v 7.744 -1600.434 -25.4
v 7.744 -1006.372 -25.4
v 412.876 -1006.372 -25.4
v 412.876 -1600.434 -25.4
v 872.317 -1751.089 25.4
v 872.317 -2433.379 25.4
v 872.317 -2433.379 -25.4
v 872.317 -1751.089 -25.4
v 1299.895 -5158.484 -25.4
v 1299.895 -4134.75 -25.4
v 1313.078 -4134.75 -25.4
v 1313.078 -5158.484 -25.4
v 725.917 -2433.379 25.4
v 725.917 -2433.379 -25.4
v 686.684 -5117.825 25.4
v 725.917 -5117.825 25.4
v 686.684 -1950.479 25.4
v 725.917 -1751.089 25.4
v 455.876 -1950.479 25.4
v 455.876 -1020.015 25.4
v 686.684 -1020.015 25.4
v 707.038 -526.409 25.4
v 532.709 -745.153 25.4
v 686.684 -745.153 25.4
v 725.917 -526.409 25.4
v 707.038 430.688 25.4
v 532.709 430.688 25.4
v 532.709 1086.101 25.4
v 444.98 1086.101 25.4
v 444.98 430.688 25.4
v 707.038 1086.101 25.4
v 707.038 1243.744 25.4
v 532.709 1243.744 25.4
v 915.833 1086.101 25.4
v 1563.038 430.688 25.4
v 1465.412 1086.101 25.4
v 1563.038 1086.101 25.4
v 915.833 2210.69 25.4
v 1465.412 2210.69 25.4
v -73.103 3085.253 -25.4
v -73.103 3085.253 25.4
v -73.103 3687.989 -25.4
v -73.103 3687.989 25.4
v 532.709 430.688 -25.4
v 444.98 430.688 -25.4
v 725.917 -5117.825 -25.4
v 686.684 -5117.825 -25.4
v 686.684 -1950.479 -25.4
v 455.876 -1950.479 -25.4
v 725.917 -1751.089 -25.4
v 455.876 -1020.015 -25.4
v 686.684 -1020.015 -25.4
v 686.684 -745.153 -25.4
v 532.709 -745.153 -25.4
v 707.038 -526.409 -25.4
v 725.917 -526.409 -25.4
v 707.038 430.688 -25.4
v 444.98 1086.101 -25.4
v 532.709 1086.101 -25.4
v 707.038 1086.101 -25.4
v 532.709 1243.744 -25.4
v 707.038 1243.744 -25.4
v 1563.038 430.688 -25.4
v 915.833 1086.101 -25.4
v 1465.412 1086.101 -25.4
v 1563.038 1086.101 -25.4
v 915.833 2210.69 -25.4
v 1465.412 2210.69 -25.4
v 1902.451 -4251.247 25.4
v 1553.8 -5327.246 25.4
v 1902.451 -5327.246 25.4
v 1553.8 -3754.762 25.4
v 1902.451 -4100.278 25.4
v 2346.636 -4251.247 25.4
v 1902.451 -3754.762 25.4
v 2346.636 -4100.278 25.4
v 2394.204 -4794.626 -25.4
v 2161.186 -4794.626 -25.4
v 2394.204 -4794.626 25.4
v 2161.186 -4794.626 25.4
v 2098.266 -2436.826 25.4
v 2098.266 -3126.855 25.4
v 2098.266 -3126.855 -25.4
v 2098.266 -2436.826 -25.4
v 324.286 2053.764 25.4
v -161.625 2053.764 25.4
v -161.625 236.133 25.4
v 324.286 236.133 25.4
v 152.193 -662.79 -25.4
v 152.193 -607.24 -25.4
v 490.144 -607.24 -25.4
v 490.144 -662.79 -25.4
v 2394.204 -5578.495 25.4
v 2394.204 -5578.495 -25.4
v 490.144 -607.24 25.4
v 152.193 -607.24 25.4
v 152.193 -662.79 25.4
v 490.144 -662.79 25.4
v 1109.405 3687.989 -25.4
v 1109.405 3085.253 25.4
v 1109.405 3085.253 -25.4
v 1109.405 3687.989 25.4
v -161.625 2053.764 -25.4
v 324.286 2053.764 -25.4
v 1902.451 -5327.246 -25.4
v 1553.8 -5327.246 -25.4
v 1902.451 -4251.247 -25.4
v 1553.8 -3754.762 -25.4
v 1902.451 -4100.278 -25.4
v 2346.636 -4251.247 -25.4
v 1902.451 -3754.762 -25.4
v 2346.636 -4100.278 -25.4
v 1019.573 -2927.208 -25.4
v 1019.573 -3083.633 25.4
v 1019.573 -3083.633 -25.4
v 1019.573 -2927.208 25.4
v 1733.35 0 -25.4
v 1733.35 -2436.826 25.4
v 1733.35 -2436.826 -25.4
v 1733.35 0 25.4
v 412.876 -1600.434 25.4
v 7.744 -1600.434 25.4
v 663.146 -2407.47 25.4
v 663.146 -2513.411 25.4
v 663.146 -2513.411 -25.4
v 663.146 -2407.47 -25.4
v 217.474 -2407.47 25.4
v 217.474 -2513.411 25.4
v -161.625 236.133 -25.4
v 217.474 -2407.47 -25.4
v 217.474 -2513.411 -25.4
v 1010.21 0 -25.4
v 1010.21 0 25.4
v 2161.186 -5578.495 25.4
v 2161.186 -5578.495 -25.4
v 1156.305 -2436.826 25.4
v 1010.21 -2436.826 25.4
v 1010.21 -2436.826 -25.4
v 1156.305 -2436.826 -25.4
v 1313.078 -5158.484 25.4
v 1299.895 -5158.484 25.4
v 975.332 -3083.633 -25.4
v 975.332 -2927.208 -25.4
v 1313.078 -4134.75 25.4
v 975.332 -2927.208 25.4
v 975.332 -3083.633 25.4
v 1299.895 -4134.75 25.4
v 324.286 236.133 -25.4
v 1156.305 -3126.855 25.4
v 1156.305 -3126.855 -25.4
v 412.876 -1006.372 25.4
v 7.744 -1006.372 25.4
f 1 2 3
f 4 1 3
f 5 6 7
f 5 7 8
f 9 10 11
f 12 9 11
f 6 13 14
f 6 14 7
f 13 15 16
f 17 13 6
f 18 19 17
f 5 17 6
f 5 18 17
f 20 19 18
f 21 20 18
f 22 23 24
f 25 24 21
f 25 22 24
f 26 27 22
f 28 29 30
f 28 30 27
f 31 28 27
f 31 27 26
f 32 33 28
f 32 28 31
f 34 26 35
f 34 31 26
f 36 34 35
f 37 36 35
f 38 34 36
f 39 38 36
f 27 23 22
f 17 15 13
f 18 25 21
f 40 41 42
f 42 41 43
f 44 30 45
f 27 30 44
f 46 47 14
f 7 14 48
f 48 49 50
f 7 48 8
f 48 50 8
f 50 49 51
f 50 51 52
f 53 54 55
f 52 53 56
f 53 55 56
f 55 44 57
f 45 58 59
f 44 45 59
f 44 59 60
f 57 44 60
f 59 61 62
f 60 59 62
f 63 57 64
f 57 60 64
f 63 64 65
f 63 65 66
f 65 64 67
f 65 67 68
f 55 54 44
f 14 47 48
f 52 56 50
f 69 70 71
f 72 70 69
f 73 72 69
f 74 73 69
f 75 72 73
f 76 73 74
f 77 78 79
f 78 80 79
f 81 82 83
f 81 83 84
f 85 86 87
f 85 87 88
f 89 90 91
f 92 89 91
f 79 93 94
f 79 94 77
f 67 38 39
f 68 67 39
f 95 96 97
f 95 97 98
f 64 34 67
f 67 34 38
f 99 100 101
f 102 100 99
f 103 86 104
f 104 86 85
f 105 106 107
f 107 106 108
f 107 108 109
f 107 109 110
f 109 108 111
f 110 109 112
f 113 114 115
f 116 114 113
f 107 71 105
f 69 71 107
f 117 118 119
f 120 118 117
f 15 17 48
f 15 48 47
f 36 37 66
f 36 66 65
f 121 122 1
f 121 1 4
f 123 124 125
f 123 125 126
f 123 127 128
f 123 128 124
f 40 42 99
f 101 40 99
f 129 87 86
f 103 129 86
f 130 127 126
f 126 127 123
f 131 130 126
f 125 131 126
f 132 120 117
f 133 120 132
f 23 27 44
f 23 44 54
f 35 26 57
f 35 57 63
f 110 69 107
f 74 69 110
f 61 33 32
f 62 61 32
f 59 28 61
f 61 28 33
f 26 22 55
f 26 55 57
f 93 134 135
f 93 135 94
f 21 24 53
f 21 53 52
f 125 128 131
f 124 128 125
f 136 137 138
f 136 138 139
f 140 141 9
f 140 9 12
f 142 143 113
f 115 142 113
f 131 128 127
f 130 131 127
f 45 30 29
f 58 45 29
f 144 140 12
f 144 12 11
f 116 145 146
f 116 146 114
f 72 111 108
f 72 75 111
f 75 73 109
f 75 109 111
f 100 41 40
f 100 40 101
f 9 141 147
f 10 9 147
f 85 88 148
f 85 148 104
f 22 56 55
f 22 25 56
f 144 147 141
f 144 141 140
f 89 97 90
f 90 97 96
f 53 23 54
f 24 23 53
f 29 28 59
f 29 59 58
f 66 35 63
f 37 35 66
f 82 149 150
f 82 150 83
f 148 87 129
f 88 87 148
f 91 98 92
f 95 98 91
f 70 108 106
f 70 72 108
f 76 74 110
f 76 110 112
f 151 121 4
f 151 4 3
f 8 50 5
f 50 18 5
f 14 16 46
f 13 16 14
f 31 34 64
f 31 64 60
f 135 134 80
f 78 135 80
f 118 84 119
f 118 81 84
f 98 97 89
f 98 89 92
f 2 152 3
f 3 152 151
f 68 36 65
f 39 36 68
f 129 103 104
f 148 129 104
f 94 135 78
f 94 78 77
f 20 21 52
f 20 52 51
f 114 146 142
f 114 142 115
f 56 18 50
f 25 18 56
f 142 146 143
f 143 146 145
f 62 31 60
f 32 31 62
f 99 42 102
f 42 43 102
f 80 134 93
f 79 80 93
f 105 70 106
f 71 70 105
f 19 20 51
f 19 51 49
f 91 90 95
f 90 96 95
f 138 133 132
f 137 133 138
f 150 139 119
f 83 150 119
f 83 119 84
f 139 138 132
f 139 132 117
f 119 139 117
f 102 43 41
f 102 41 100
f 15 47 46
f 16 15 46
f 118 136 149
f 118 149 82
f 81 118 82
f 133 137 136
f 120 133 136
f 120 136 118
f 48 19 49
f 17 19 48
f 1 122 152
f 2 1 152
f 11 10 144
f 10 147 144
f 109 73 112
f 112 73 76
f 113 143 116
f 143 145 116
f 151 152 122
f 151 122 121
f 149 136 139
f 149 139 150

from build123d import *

# Parameters (mm, degrees)
F0_W          = 44.2409515381
F0_H          = 156.4252376556
F1_DEPTH      = 25.399999693
F1_DEPTH_BACK = 25.4
F0_W_2        = 22.5378274918
F0_H_2        = 731.0734987259
F0_H_3        = 199.3902921677
F0_W_3        = 146.3996171951
F0_H_4        = 682.2904348373
F0_W_4        = 39.233148098
F0_H_5        = 2684.4458580017
F0_W_5        = 20.3537940979
F0_H_6        = 218.7442779541
F0_W_6        = 174.3287444115
F0_H_7        = 655.4131507874
F0_W_7        = 87.7292752266
F0_H_8        = 157.6430797577
F0_W_8        = 549.5787858963
F0_H_9        = 11.6560459137
F0_H_10       = 1124.5892047882
F0_W_9        = 1182.5087666512
F0_H_11       = 602.7357578278
F0_W_10       = 485.9105348587
F0_H_12       = 1817.6312446594
F0_W_11       = 337.9504084587
F0_H_13       = 55.5500984192
F0_W_12       = 405.1321148872
F0_H_14       = 594.0616130829
F0_W_13       = 445.6715583801
F0_H_15       = 105.9410572052
F0_W_14       = 233.0176830292
F0_H_16       = 783.86926651
F0_W_15       = 206.1629295349
F0_H_17       = 150.9690284729
F0_W_16       = 444.1845417023
F0_W_17       = 13.18359375
F0_H_18       = 1023.7331390381


with BuildPart() as f1:
    # F0 (on Top) → F1 (new body, two sides)
    with BuildSketch(Plane.XY) as f1_sk:
        with Locations((997.4524974823, -3005.4203271866)):
            Rectangle(F0_W, F0_H)
    extrude(amount=F1_DEPTH)
    extrude(f1_sk.sketch, amount=-F1_DEPTH_BACK)


with BuildPart() as f1b:
    # F0 (on Top) → F1, piece 2 (new body, two sides)
    with BuildSketch(Plane.XY) as f1_2_sk:
        with Locations((697.9529857635, -1385.5519890785)):
            Rectangle(F0_W_2, F0_H_2)
        with Locations((697.9529857635, -1850.7838845253)):
            Rectangle(F0_W_2, F0_H_3)
        Polygon((686.6840720177, -1950.4790306091), (686.6840720177, -1751.0887384415), (686.6840720177, -1020.0152397156), (455.8762907982, -1020.0152397156), (455.8762907982, -1950.4790306091), align=None)
        Polygon((709.2218995094, -1020.0152397156), (709.2218995094, -1751.0887384415), (725.9172201157, -1751.0887384415), (725.9172201157, -526.4091491699), (707.0378661156, -526.4091491699), (707.0378661156, -745.153427124), (686.6840720177, -745.153427124), (686.6840720177, -1020.0152397156), align=None)
        Polygon((725.9172201157, -1751.0887384415), (709.2218995094, -1751.0887384415), (709.2218995094, -1950.4790306091), (686.6840720177, -1950.4790306091), (686.6840720177, -2433.3791732788), (725.9172201157, -2433.3791732788), align=None)
        with Locations((799.1170287132, -2092.2339558601)):
            Rectangle(F0_W_3, F0_H_4)
        with Locations((706.3006460667, -3775.6021022797)):
            Rectangle(F0_W_4, F0_H_5)
        Polygon((532.7091217041, -745.153427124), (686.6840720177, -745.153427124), (686.6840720177, -526.4091491699), (707.0378661156, -526.4091491699), (707.0378661156, 430.6876659393), (532.7091217041, 430.6876659393), align=None)
        with Locations((696.8609690666, -635.781288147)):
            Rectangle(F0_W_5, F0_H_6)
        with Locations((619.8734939098, 758.394241333)):
            Rectangle(F0_W_6, F0_H_7)
        with Locations((488.8444840908, 758.394241333)):
            Rectangle(F0_W_7, F0_H_7)
        Polygon((707.0378661156, 1086.1008167267), (707.0378661156, 430.6876659393), (1563.038110733, 430.6876659393), (1563.038110733, 1086.1008167267), (1465.4121398926, 1086.1008167267), (1465.4121398926, 1074.444770813), (915.8333539963, 1074.444770813), (915.8333539963, 1086.1008167267), align=None)
        with Locations((619.8734939098, 1164.9223566055)):
            Rectangle(F0_W_6, F0_H_8)
        with Locations((1190.6227469444, 1080.2727937698)):
            Rectangle(F0_W_8, F0_H_9)
        with Locations((1190.6227469444, 1648.3954191208)):
            Rectangle(F0_W_8, F0_H_10)
    extrude(amount=F1_DEPTH)
    extrude(f1_2_sk.sketch, amount=-F1_DEPTH_BACK)


with BuildPart() as f1c:
    # F0 (on Top) → F1, piece 3 (new body, two sides)
    with BuildSketch(Plane.XY) as f1_3_sk:
        Polygon((1733.3495616913, 0), (1010.2095603943, 0), (1010.2095603943, -2436.8262290955), (1156.3047170639, -2436.8262290955), (1733.3495616913, -2436.8262290955), align=None)
        Polygon((2098.2656478882, -2436.8262290955), (1733.3495616913, -2436.8262290955), (1156.3047170639, -2436.8262290955), (1156.3047170639, -3126.8546581268), (2098.2656478882, -3126.8546581268), align=None)
    extrude(amount=F1_DEPTH)
    extrude(f1_3_sk.sketch, amount=-F1_DEPTH_BACK)


with BuildPart() as f1d:
    # F0 (on Top) → F1, piece 4 (new body, two sides)
    with BuildSketch(Plane.XY) as f1_4_sk:
        with Locations((518.150895834, 3386.6211175919)):
            Rectangle(F0_W_9, F0_H_11)
    extrude(amount=F1_DEPTH)
    extrude(f1_4_sk.sketch, amount=-F1_DEPTH_BACK)


with BuildPart() as f1e:
    # F0 (on Top) → F1, piece 5 (new body, two sides)
    with BuildSketch(Plane.XY) as f1_5_sk:
        with Locations((81.3304185867, 1144.948720932)):
            Rectangle(F0_W_10, F0_H_12)
    extrude(amount=F1_DEPTH)
    extrude(f1_5_sk.sketch, amount=-F1_DEPTH_BACK)


with BuildPart() as f1f:
    # F0 (on Top) → F1, piece 6 (new body, two sides)
    with BuildSketch(Plane.XY) as f1_6_sk:
        with Locations((321.1685121059, -635.0152492523)):
            Rectangle(F0_W_11, F0_H_13)
    extrude(amount=F1_DEPTH)
    extrude(f1_6_sk.sketch, amount=-F1_DEPTH_BACK)


with BuildPart() as f1g:
    # F0 (on Top) → F1, piece 7 (new body, two sides)
    with BuildSketch(Plane.XY) as f1_7_sk:
        with Locations((210.3101909161, -1303.4030199051)):
            Rectangle(F0_W_12, F0_H_14)
    extrude(amount=F1_DEPTH)
    extrude(f1_7_sk.sketch, amount=-F1_DEPTH_BACK)


with BuildPart() as f1h:
    # F0 (on Top) → F1, piece 8 (new body, two sides)
    with BuildSketch(Plane.XY) as f1_8_sk:
        with Locations((440.309882164, -2460.4402780533)):
            Rectangle(F0_W_13, F0_H_15)
    extrude(amount=F1_DEPTH)
    extrude(f1_8_sk.sketch, amount=-F1_DEPTH_BACK)


with BuildPart() as f1i:
    # F0 (on Top) → F1, piece 9 (new body, two sides)
    with BuildSketch(Plane.XY) as f1_9_sk:
        with Locations((2277.6950597763, -5186.5603923798)):
            Rectangle(F0_W_14, F0_H_16)
    extrude(amount=F1_DEPTH)
    extrude(f1_9_sk.sketch, amount=-F1_DEPTH_BACK)


with BuildPart() as f1j:
    # F0 (on Top) → F1, piece 10 (new body, two sides)
    with BuildSketch(Plane.XY) as f1_10_sk:
        Polygon((1553.8001060486, -5327.2461891174), (1902.4512767792, -5327.2461891174), (1902.4512767792, -4251.2474060059), (1696.2883472443, -4251.2474060059), (1696.2883472443, -4100.278377533), (1902.4512767792, -4100.278377533), (1902.4512767792, -3754.7616958618), (1553.8001060486, -3754.7616958618), align=None)
        with Locations((1799.3698120117, -4175.7628917694)):
            Rectangle(F0_W_15, F0_H_17)
        with Locations((2124.5435476303, -4175.7628917694)):
            Rectangle(F0_W_16, F0_H_17)
    extrude(amount=F1_DEPTH)
    extrude(f1_10_sk.sketch, amount=-F1_DEPTH_BACK)


with BuildPart() as f1k:
    # F0 (on Top) → F1, piece 11 (new body, two sides)
    with BuildSketch(Plane.XY) as f1_11_sk:
        with Locations((1306.4863681793, -4646.61693573)):
            Rectangle(F0_W_17, F0_H_18)
    extrude(amount=F1_DEPTH)
    extrude(f1_11_sk.sketch, amount=-F1_DEPTH_BACK)


solid = Compound([f1.part, f1b.part, f1c.part, f1d.part, f1e.part, f1f.part, f1g.part, f1h.part, f1i.part, f1j.part, f1k.part])
